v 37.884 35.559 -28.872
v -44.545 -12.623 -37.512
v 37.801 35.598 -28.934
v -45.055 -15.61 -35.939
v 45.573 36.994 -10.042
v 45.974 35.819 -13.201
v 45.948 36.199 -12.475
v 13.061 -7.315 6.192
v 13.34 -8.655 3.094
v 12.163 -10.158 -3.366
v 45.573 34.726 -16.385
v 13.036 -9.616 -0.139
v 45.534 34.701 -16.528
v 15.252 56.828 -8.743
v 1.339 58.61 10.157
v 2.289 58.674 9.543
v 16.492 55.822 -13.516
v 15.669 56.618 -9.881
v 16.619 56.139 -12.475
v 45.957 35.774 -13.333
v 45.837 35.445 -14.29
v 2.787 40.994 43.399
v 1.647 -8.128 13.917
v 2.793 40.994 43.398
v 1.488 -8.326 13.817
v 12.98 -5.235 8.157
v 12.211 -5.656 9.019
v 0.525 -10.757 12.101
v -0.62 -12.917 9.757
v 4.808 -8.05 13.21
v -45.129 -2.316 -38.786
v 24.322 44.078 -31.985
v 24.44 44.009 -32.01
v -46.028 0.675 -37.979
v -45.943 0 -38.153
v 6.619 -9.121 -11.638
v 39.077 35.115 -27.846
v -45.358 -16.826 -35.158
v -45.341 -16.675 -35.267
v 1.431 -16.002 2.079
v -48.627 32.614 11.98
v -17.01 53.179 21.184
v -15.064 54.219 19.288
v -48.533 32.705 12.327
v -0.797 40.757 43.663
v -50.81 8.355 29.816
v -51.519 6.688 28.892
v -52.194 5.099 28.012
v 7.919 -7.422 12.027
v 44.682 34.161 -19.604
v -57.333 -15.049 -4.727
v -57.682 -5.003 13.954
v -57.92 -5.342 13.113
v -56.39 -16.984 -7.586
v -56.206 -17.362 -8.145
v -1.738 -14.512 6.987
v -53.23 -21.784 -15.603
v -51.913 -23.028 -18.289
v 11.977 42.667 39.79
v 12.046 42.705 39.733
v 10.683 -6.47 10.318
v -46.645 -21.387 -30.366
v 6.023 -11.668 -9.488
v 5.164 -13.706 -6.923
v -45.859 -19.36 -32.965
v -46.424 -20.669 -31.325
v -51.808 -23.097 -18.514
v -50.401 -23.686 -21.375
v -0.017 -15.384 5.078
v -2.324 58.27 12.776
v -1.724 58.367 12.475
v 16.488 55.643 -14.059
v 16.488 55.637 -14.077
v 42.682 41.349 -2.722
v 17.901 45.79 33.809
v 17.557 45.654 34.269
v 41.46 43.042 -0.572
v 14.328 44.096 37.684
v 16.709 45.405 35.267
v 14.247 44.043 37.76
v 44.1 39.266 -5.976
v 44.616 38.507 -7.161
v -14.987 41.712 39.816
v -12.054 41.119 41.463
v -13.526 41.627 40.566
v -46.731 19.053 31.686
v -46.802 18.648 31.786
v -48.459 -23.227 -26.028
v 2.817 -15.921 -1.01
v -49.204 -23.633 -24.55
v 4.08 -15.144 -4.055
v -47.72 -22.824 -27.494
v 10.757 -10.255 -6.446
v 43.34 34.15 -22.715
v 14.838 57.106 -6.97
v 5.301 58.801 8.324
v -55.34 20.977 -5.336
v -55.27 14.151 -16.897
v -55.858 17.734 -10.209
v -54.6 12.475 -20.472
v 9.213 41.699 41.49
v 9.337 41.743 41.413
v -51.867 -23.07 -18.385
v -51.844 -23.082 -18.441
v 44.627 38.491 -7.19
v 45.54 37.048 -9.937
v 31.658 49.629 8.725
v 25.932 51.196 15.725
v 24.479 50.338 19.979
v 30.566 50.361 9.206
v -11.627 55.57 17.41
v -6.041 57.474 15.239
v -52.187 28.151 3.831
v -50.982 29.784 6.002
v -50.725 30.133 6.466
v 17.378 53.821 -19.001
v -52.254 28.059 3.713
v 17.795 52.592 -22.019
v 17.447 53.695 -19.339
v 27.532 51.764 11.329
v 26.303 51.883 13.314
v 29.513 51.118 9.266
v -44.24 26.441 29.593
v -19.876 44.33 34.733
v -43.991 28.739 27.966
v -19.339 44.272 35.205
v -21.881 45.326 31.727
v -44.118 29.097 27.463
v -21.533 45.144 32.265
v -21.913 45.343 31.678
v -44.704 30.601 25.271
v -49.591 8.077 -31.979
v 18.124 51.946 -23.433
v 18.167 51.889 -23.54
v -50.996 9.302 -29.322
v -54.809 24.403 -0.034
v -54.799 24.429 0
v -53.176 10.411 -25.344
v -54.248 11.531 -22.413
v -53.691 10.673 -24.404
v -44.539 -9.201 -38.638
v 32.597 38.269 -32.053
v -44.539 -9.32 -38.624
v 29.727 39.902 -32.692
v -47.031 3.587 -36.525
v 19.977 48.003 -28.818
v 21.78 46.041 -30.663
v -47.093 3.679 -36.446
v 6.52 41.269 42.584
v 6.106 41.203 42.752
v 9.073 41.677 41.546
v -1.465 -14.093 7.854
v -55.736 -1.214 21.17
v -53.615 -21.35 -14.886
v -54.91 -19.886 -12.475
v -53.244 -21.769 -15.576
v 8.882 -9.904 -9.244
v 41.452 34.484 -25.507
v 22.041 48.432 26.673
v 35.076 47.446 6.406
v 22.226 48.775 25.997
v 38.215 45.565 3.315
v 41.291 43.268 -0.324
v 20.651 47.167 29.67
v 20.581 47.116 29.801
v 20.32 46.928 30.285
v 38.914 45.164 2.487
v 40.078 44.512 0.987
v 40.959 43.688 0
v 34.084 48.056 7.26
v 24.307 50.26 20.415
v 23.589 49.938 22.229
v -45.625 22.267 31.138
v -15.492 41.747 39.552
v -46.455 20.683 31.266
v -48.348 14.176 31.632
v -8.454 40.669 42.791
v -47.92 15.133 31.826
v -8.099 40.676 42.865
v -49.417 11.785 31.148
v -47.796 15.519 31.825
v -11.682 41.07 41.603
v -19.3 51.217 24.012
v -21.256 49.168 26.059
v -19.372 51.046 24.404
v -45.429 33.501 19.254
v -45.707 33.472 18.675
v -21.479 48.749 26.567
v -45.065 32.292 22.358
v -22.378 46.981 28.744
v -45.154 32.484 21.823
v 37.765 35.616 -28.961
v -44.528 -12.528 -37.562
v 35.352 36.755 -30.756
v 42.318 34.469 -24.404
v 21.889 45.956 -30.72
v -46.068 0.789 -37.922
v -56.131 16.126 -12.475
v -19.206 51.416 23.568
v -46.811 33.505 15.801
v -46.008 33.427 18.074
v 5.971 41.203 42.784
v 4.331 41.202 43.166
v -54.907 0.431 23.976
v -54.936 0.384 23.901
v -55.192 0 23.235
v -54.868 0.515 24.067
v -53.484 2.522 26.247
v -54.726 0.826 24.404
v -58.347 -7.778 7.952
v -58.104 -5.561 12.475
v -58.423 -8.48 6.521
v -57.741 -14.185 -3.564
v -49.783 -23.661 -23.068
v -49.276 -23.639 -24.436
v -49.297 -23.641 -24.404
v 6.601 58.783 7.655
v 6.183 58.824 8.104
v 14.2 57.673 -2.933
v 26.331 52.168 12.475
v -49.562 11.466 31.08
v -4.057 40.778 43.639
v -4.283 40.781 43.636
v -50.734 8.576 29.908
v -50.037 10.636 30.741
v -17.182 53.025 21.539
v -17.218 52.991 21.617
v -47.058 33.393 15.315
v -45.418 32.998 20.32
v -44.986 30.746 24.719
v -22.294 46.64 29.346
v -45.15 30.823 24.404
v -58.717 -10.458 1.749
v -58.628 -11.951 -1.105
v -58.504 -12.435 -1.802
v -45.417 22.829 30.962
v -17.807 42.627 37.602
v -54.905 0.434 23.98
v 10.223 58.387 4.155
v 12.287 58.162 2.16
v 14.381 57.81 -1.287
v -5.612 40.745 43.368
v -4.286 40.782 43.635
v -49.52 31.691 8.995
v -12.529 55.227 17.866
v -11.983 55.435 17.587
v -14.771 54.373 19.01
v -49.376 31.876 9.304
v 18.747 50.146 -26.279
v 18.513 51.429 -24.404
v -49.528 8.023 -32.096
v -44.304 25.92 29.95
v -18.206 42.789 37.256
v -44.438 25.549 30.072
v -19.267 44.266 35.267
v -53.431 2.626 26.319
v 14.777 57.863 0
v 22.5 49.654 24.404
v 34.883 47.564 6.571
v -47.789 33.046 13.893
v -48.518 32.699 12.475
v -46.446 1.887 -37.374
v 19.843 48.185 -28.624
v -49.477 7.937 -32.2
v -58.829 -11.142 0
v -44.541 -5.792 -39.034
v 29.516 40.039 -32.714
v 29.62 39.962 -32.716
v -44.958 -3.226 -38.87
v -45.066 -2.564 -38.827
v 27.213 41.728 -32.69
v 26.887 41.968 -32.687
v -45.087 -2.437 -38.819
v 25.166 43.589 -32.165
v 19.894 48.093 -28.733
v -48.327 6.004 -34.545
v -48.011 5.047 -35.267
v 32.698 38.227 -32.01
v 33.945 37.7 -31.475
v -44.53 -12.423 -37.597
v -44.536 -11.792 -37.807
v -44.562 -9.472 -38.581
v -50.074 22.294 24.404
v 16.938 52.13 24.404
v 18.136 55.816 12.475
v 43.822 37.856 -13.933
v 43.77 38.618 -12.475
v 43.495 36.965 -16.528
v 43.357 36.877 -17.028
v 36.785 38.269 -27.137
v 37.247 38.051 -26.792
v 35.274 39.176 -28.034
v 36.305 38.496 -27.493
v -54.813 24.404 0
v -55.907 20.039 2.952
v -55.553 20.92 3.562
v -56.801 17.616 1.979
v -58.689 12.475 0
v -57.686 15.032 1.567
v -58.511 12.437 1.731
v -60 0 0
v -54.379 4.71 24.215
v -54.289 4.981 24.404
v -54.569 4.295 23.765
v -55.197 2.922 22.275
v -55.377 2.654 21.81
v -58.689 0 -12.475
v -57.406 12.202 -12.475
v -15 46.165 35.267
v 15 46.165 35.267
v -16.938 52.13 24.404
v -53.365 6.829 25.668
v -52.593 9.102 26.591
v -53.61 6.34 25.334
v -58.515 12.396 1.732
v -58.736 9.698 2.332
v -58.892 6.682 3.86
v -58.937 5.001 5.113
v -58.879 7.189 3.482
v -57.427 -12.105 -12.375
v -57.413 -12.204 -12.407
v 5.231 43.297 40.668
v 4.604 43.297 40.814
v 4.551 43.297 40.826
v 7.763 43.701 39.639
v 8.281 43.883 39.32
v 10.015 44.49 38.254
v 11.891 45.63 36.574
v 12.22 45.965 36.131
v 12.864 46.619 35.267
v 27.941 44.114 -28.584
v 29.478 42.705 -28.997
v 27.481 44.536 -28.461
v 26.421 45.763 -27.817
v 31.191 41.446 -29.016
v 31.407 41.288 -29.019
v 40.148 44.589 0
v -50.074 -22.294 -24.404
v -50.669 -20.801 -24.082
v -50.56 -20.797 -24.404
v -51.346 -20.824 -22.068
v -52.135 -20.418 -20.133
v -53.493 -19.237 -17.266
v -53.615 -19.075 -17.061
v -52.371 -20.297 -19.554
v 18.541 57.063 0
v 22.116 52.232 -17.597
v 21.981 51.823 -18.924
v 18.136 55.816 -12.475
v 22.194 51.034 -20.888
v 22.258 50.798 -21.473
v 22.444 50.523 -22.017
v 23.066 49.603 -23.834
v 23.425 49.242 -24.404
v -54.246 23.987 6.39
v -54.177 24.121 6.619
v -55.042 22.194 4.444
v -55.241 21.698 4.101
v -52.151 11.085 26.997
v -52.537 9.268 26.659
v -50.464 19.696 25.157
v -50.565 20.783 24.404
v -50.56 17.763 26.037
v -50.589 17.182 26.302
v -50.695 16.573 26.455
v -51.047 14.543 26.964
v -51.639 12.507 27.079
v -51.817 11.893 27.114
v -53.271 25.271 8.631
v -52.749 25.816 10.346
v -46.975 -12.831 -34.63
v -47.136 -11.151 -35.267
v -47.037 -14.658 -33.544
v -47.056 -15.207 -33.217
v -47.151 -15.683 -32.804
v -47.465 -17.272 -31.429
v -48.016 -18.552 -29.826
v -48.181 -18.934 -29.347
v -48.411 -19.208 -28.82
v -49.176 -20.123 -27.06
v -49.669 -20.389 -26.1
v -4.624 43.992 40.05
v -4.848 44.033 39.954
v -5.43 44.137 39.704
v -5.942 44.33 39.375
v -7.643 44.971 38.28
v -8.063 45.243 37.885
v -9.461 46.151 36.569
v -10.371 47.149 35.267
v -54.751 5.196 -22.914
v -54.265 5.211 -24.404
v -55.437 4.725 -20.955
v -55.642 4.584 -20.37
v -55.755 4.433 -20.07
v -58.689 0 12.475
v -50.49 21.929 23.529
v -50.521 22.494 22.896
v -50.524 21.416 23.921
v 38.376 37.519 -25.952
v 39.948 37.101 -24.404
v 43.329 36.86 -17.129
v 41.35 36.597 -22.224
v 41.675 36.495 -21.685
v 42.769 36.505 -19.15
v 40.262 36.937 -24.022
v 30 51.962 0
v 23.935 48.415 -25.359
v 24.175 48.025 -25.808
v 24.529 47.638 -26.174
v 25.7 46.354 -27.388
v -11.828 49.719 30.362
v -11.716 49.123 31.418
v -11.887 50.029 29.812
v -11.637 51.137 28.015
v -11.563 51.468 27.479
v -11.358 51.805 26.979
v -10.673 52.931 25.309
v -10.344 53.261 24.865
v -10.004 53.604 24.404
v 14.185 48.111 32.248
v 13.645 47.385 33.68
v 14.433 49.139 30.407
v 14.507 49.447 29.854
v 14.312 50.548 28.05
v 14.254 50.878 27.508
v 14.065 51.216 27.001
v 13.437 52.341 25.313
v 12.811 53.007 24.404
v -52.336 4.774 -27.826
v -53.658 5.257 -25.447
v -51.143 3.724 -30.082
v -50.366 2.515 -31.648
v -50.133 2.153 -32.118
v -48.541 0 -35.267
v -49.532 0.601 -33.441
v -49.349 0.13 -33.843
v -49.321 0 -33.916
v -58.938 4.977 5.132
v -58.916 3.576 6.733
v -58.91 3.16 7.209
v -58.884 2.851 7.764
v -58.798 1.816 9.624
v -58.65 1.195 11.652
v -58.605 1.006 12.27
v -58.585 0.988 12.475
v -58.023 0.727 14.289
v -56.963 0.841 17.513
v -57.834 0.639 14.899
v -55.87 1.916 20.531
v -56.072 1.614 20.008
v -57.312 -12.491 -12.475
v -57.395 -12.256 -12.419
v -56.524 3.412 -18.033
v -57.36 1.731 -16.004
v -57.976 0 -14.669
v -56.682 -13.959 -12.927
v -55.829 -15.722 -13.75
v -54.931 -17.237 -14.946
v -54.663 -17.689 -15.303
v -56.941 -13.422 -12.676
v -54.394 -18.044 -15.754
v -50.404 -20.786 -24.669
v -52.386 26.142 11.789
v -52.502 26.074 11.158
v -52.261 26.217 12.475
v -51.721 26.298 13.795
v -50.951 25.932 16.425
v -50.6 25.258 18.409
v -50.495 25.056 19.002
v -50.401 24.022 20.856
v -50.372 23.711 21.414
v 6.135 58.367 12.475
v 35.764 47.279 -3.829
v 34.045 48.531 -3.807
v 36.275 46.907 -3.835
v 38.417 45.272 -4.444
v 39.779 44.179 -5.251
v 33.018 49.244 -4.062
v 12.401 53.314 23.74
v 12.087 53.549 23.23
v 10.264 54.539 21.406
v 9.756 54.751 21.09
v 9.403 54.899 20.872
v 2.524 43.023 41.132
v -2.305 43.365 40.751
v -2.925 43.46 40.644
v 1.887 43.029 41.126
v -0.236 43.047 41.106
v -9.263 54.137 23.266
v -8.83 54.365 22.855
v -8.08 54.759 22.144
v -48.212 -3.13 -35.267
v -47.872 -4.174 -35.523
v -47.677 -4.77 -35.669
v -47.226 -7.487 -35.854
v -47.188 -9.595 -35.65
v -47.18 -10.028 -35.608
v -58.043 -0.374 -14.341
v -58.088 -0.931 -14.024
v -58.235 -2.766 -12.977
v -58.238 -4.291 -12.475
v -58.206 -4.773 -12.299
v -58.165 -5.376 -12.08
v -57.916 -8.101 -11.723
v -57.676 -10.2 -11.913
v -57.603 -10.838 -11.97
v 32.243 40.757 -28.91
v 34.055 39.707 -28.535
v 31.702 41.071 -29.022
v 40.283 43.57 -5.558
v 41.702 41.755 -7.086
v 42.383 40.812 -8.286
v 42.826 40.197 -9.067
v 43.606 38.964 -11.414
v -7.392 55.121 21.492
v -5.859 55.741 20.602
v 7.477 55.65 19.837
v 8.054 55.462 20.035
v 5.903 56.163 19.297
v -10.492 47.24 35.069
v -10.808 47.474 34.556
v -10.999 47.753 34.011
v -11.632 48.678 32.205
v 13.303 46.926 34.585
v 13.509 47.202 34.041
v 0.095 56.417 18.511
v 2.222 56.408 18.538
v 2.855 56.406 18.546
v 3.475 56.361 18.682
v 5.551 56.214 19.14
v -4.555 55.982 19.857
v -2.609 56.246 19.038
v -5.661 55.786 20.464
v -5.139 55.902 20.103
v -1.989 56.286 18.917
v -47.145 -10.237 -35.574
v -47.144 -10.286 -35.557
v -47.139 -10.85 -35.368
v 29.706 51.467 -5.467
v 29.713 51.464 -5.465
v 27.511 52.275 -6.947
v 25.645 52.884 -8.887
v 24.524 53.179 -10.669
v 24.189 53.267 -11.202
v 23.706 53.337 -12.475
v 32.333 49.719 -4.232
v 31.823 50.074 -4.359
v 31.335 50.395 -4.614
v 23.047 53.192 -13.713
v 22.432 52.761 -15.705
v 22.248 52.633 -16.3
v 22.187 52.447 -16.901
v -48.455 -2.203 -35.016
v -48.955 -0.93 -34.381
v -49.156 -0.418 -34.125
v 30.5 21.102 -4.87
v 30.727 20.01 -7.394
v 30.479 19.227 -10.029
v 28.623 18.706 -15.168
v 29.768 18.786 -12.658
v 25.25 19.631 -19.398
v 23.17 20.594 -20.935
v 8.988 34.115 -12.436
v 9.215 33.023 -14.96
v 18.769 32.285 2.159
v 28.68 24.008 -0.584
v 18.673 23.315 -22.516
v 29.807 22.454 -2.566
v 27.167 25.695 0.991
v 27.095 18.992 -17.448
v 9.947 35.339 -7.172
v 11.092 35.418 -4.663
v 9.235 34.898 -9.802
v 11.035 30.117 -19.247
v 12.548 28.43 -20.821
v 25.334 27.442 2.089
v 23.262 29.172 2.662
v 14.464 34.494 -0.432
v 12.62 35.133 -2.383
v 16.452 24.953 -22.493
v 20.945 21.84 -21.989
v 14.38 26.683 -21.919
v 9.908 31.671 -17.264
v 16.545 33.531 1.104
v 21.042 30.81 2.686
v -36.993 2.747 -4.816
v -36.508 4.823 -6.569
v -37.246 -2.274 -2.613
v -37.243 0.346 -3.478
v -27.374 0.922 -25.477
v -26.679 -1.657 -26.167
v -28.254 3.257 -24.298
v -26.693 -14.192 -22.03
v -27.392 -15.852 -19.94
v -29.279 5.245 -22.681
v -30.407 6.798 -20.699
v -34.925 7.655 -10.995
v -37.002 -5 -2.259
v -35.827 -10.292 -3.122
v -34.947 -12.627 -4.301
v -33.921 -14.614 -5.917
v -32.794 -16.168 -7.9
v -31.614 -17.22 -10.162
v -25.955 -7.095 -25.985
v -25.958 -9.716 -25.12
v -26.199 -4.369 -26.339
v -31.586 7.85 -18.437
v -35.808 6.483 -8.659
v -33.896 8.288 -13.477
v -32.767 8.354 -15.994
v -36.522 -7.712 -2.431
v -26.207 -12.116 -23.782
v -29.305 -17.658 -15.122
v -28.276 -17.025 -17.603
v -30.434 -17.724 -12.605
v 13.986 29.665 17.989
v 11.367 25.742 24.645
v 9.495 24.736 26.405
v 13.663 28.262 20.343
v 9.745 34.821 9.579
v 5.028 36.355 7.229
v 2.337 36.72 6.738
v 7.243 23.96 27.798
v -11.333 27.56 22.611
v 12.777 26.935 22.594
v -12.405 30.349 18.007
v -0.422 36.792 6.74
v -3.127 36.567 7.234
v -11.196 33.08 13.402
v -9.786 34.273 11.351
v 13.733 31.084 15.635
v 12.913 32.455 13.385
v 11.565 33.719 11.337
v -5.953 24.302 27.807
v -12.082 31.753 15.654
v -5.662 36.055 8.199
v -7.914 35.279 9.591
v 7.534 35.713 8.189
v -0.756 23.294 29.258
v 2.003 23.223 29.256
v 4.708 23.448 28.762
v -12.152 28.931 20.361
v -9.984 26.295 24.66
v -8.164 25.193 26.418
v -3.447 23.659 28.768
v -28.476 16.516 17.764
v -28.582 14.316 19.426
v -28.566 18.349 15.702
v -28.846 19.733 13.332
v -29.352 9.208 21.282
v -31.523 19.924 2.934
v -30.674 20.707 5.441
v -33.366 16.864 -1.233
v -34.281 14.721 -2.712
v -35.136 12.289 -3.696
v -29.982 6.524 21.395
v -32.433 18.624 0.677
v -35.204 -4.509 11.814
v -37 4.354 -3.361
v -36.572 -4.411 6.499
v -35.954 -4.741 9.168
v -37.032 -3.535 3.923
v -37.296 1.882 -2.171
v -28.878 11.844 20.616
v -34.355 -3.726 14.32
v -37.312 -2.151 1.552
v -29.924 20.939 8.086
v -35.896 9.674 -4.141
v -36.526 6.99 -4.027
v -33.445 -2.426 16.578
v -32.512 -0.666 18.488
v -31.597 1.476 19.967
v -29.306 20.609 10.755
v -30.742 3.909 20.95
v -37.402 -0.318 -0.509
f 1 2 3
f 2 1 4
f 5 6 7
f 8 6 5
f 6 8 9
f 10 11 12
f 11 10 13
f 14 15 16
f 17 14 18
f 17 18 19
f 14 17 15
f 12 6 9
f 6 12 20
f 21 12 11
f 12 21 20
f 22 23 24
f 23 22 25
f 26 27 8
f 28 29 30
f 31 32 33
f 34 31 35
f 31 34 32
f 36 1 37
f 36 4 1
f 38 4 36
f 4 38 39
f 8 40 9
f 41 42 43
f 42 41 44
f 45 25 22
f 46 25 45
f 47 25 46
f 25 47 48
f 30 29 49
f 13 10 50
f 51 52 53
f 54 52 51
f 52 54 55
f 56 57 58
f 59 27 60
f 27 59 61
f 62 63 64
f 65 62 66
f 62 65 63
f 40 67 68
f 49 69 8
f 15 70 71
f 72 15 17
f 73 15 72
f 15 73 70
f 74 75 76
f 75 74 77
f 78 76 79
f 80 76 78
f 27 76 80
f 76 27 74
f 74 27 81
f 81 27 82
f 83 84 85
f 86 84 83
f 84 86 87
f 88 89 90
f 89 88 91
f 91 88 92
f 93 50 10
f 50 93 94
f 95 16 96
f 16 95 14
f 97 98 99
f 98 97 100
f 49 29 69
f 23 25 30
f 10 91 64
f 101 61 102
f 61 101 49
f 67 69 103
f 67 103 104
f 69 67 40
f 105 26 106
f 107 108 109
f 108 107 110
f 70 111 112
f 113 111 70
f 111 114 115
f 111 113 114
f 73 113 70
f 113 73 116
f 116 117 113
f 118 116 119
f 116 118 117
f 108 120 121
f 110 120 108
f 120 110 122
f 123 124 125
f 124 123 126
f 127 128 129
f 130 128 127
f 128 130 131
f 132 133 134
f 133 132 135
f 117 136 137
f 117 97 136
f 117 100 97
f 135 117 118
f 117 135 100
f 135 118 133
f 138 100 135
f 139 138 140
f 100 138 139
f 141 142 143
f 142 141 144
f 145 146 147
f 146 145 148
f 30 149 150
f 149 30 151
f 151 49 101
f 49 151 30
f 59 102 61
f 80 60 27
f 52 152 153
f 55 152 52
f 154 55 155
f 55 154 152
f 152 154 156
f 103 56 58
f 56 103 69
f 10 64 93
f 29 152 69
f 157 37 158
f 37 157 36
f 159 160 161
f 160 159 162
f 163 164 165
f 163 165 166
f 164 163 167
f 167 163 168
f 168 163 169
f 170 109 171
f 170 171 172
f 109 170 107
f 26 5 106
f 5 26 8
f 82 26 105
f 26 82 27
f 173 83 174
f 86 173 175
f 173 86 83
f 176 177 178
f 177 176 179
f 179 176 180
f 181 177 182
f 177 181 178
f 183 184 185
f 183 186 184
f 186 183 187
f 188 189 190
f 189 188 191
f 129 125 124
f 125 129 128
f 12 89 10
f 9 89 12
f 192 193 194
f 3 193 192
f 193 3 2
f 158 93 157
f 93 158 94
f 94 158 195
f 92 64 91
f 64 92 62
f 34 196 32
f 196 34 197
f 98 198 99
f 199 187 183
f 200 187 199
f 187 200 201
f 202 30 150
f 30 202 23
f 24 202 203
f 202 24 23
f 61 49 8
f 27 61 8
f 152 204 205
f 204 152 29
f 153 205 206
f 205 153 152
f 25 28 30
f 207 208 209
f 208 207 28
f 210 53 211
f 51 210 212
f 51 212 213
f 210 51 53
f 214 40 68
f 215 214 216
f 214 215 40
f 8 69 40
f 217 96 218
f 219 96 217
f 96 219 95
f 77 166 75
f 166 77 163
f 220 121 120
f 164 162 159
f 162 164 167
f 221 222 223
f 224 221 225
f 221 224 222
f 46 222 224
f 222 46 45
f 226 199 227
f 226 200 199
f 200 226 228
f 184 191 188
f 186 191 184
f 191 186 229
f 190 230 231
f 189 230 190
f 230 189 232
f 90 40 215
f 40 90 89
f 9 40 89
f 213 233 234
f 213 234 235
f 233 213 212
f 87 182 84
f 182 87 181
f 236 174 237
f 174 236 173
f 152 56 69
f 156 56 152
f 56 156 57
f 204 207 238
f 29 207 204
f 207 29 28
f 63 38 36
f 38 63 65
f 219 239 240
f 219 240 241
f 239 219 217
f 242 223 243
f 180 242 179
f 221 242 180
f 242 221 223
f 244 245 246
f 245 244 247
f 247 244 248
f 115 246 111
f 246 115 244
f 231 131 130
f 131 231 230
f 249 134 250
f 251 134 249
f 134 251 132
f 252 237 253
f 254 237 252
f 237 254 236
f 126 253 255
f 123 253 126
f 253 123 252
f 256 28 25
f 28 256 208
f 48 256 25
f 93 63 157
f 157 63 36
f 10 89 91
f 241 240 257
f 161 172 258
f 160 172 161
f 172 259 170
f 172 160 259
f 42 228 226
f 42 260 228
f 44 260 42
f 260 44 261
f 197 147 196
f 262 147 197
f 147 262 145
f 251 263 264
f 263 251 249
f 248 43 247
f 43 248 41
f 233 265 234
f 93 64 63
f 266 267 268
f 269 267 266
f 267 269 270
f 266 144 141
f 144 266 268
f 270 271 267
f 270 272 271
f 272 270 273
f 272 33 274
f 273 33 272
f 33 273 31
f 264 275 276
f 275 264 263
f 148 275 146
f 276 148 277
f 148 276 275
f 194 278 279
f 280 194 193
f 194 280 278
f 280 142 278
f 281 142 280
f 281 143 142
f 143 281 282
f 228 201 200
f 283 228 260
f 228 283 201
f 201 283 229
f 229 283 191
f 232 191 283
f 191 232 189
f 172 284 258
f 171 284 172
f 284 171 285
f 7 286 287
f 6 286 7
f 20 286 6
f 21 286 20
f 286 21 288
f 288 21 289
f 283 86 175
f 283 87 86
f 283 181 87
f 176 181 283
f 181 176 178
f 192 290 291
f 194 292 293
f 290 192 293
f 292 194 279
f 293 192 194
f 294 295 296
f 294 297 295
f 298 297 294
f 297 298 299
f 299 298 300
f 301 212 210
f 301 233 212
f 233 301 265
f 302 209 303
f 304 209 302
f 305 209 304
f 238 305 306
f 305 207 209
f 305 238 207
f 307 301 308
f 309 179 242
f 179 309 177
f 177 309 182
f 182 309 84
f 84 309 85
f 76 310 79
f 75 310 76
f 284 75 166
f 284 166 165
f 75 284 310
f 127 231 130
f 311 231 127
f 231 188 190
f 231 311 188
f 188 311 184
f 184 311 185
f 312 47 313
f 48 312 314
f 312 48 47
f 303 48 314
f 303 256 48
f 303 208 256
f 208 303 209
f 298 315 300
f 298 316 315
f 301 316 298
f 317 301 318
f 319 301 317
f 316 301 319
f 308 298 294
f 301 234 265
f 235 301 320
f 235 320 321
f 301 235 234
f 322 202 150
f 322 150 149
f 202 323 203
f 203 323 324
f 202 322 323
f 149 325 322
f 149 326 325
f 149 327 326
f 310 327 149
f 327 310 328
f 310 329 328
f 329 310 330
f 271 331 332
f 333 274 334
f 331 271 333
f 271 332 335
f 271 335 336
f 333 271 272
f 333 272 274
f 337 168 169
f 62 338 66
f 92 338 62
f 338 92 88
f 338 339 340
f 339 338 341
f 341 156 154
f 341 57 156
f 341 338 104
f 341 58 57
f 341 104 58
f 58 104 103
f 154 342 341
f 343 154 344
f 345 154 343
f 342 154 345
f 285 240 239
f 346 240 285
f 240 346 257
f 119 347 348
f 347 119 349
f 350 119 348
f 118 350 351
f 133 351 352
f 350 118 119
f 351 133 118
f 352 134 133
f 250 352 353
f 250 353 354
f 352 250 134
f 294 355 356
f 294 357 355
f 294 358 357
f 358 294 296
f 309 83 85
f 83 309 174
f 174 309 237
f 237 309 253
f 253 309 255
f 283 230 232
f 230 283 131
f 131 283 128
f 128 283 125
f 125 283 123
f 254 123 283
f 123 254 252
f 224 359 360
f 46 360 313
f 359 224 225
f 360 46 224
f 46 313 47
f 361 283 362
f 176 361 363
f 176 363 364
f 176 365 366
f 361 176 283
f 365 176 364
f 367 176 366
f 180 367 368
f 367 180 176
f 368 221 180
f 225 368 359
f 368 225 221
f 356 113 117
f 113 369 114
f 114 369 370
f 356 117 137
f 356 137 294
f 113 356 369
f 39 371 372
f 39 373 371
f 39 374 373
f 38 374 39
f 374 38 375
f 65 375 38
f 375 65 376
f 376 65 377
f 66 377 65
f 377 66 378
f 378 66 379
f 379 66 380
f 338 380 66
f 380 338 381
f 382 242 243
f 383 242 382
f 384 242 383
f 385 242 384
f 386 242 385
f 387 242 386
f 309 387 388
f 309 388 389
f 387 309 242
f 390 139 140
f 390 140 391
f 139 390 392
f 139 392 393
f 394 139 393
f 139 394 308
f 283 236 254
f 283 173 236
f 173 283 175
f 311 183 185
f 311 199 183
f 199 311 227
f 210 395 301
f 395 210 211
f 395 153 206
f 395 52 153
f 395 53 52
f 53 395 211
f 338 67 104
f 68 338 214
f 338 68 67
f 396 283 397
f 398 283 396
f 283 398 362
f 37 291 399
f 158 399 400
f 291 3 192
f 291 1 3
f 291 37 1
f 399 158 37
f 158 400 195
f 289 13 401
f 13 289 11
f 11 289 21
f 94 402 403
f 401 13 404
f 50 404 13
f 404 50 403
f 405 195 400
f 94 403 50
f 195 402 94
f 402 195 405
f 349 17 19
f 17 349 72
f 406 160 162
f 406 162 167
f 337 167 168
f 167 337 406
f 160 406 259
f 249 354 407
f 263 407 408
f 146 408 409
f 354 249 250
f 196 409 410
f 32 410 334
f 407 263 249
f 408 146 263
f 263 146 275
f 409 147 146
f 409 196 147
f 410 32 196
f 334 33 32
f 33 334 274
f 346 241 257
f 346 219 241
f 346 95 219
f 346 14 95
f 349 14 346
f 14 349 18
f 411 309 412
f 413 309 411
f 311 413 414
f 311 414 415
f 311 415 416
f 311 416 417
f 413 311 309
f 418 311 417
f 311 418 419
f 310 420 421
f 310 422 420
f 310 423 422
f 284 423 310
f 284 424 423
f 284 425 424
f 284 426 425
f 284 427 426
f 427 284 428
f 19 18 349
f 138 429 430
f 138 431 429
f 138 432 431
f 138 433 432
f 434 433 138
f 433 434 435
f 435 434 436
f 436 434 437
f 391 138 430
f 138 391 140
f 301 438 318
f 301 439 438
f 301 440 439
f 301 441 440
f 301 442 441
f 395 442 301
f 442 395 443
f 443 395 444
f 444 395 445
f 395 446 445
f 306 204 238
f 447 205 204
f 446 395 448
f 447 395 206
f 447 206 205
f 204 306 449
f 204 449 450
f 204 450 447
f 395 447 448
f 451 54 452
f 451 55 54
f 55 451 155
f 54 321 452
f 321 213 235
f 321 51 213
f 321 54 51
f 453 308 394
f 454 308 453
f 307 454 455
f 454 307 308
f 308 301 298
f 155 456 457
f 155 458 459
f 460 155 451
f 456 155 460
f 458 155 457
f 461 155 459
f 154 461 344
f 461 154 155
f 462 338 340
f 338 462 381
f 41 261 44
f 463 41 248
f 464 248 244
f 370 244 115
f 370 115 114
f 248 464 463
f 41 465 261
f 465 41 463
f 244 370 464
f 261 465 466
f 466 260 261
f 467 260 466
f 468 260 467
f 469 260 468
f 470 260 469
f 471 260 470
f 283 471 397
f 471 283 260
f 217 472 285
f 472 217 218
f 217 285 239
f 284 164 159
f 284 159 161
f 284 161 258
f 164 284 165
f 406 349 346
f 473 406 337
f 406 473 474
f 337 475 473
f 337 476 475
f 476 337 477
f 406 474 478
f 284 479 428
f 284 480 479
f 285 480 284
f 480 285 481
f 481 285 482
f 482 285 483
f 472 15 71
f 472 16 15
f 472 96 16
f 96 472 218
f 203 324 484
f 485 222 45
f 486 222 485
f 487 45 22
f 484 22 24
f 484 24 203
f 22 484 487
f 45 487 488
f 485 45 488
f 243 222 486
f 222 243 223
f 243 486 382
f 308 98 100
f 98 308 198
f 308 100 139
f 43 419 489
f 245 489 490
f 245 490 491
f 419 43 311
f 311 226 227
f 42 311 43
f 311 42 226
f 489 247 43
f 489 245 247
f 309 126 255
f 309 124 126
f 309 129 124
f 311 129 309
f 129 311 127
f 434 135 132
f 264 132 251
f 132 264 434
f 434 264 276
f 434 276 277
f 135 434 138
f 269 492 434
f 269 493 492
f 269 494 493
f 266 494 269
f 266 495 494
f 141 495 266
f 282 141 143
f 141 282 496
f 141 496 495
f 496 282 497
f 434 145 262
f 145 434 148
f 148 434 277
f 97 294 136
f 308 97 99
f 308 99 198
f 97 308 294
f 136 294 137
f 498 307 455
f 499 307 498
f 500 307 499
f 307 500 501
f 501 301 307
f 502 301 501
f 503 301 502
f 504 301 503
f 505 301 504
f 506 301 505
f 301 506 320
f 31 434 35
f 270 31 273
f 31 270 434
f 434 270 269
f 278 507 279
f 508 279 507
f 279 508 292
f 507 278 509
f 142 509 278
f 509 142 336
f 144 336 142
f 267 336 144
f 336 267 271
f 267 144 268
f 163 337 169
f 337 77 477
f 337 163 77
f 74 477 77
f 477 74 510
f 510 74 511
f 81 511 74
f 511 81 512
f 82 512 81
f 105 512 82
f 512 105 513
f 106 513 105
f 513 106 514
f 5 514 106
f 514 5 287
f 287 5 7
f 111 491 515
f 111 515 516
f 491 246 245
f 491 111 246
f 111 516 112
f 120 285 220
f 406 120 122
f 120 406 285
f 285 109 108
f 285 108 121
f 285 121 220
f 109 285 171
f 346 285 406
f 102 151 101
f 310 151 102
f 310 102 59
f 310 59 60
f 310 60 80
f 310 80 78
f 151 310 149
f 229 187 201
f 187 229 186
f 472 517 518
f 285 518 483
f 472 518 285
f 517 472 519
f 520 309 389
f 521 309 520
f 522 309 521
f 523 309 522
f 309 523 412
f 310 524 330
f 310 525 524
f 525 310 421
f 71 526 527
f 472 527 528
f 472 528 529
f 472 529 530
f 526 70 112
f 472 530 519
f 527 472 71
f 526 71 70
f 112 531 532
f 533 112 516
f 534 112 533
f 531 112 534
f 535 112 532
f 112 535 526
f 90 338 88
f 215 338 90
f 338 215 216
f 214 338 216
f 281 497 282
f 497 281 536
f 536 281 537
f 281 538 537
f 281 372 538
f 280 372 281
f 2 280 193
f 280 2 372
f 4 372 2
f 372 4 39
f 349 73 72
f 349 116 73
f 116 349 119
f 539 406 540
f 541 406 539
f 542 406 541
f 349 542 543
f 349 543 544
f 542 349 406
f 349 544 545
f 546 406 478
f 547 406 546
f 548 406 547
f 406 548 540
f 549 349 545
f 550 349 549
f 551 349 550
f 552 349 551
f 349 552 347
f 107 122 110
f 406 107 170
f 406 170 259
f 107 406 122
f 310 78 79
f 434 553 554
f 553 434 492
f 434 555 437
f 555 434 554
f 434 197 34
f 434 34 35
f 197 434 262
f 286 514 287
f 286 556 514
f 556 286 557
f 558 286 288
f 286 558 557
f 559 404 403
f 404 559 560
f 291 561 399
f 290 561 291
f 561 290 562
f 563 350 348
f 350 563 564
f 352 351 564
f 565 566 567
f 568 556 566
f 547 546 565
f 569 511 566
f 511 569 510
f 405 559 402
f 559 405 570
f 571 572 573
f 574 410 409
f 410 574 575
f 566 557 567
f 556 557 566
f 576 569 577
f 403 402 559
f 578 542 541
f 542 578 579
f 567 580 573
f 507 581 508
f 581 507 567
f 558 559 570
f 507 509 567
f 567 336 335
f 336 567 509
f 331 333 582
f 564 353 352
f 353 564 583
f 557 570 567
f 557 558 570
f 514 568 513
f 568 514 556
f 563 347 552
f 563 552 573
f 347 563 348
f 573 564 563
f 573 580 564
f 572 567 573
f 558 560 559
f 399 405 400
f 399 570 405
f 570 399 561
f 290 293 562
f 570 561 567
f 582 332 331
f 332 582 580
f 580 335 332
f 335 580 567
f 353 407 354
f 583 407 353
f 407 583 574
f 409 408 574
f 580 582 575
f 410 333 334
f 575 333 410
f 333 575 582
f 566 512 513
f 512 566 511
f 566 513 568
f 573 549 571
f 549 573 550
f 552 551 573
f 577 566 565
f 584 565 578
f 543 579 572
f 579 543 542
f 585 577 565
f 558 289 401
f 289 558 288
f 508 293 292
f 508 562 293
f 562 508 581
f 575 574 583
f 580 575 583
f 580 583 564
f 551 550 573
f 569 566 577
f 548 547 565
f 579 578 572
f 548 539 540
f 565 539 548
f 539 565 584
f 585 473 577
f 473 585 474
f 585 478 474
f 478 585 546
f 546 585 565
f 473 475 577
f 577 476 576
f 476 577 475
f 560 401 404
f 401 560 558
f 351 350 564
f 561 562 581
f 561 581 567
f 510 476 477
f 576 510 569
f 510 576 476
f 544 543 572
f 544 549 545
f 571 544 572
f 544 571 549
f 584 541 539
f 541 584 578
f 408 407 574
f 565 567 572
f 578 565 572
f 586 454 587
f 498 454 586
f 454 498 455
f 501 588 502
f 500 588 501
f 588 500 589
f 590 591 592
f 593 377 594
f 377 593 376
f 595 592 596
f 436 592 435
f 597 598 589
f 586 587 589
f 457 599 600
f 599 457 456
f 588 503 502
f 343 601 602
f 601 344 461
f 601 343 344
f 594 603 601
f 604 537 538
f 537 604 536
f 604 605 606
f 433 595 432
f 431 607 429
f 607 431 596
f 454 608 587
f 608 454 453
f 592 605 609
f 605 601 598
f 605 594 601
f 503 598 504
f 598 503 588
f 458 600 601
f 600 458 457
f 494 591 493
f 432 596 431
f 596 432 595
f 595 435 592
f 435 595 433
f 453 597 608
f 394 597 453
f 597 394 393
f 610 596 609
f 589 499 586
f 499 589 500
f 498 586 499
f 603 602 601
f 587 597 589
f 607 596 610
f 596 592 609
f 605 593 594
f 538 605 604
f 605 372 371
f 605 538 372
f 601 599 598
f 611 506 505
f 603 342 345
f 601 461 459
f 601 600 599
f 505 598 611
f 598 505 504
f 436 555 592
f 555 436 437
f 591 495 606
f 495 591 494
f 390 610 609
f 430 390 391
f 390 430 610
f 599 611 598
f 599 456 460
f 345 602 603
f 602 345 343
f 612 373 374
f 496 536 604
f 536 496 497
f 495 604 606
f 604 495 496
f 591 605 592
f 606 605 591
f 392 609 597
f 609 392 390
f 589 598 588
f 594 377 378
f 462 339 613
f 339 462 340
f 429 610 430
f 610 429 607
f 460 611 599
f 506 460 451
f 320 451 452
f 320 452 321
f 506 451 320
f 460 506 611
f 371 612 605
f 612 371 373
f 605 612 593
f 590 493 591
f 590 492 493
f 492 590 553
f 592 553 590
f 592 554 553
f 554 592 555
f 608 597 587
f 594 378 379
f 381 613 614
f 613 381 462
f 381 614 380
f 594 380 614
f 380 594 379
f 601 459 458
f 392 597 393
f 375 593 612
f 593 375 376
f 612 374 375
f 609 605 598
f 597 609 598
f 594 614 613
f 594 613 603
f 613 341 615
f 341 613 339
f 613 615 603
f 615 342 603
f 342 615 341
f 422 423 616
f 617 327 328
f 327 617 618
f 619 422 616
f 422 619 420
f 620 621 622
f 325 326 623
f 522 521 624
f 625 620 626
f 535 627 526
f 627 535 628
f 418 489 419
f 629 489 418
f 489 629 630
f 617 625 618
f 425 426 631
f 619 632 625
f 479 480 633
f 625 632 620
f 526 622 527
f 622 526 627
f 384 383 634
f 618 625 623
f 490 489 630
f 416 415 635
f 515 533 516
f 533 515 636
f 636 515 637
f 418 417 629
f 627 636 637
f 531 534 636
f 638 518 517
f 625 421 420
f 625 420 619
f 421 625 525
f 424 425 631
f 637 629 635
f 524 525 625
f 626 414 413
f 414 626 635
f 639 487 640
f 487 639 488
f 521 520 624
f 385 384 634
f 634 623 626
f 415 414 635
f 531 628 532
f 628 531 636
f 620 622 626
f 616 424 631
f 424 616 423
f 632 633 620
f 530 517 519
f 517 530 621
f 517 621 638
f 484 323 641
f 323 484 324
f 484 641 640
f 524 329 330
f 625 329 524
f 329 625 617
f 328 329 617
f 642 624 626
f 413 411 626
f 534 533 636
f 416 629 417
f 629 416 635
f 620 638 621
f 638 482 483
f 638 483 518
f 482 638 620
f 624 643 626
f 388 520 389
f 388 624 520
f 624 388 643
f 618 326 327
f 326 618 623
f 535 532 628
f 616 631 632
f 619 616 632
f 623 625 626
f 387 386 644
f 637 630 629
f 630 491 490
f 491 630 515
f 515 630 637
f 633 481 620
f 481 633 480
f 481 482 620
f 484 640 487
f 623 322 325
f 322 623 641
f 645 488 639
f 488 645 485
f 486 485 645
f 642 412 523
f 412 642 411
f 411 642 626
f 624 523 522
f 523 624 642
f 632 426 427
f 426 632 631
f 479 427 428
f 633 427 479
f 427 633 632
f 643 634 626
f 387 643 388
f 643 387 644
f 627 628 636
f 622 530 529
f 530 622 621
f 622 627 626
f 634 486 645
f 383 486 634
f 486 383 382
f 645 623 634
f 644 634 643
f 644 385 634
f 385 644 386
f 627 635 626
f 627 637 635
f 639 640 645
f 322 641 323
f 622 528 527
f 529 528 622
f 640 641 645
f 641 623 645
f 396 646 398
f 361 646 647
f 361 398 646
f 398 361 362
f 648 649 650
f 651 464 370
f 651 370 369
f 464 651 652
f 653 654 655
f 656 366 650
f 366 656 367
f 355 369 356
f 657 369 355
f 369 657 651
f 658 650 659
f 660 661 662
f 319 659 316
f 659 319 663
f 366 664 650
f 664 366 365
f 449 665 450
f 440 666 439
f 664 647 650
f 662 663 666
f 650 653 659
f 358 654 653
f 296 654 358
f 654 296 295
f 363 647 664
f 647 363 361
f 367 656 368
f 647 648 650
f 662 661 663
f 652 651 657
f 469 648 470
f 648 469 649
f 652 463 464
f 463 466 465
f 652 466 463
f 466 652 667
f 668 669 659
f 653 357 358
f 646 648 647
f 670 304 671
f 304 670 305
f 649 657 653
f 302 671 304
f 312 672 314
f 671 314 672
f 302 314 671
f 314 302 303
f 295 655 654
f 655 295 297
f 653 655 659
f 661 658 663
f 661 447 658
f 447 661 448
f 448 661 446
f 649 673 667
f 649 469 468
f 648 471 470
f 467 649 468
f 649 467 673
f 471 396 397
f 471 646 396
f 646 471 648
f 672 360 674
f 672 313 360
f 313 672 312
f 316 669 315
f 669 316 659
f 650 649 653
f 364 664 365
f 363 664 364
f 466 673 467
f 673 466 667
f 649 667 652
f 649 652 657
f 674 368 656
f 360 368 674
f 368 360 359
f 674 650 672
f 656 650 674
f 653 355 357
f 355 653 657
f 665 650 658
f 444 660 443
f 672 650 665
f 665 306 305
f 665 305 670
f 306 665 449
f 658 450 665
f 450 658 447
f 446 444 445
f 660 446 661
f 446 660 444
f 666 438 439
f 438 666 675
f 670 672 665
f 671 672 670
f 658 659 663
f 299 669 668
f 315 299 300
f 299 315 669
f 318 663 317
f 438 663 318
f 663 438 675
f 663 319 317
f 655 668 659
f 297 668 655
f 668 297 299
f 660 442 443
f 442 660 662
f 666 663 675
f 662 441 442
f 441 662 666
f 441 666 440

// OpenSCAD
difference() {
	intersection() {
		hull() {
			rotate(a = -44.0760747966, v = [0.5629948017, 0.4085512351, -0.0000000000]) {
				rotate(a = -90.0000000000, v = [0.8660254038, -0.5000000000, 0.0000000000]) {
					cylinder(h = 60, r = 16.2000000000);
				}
			}
			rotate(a = -44.0760747966, v = [0.5629948017, 0.4085512351, -0.0000000000]) {
				rotate(a = -90.0000000000, v = [0.0000000000, 1.0000000000, -0.0000000000]) {
					cylinder(h = 60, r = 16.2000000000);
				}
			}
			rotate(a = -44.0760747966, v = [0.5629948017, 0.4085512351, -0.0000000000]) {
				rotate(a = -32.5529951665, v = [0.4127226266, -0.3452383875, 0.0000000000]) {
					cylinder(h = 60, r = 16.2000000000);
				}
			}
			rotate(a = -44.0760747966, v = [0.5629948017, 0.4085512351, -0.0000000000]) {
				rotate(a = -46.2229214243, v = [-0.0760264543, 0.7180233296, 0.0000000000]) {
					cylinder(h = 60, r = 16.2000000000);
				}
			}
		}
		sphere(r = 60);
	}
	union() {
		rotate(a = -44.0760747966, v = [0.5629948017, 0.4085512351, -0.0000000000]) {
			rotate(a = -90.0000000000, v = [0.8660254038, -0.5000000000, 0.0000000000]) {
				translate(v = [0, 0, 35]) {
					cylinder(h = 100, r = 13.2000000000);
				}
			}
		}
		rotate(a = -44.0760747966, v = [0.5629948017, 0.4085512351, -0.0000000000]) {
			rotate(a = -90.0000000000, v = [0.0000000000, 1.0000000000, -0.0000000000]) {
				translate(v = [0, 0, 35]) {
					cylinder(h = 100, r = 13.2000000000);
				}
			}
		}
		rotate(a = -44.0760747966, v = [0.5629948017, 0.4085512351, -0.0000000000]) {
			rotate(a = -32.5529951665, v = [0.4127226266, -0.3452383875, 0.0000000000]) {
				translate(v = [0, 0, 35]) {
					cylinder(h = 100, r = 13.2000000000);
				}
			}
		}
		rotate(a = -44.0760747966, v = [0.5629948017, 0.4085512351, -0.0000000000]) {
			rotate(a = -46.2229214243, v = [-0.0760264543, 0.7180233296, 0.0000000000]) {
				translate(v = [0, 0, 35]) {
					cylinder(h = 100, r = 13.2000000000);
				}
			}
		}
	}
}
